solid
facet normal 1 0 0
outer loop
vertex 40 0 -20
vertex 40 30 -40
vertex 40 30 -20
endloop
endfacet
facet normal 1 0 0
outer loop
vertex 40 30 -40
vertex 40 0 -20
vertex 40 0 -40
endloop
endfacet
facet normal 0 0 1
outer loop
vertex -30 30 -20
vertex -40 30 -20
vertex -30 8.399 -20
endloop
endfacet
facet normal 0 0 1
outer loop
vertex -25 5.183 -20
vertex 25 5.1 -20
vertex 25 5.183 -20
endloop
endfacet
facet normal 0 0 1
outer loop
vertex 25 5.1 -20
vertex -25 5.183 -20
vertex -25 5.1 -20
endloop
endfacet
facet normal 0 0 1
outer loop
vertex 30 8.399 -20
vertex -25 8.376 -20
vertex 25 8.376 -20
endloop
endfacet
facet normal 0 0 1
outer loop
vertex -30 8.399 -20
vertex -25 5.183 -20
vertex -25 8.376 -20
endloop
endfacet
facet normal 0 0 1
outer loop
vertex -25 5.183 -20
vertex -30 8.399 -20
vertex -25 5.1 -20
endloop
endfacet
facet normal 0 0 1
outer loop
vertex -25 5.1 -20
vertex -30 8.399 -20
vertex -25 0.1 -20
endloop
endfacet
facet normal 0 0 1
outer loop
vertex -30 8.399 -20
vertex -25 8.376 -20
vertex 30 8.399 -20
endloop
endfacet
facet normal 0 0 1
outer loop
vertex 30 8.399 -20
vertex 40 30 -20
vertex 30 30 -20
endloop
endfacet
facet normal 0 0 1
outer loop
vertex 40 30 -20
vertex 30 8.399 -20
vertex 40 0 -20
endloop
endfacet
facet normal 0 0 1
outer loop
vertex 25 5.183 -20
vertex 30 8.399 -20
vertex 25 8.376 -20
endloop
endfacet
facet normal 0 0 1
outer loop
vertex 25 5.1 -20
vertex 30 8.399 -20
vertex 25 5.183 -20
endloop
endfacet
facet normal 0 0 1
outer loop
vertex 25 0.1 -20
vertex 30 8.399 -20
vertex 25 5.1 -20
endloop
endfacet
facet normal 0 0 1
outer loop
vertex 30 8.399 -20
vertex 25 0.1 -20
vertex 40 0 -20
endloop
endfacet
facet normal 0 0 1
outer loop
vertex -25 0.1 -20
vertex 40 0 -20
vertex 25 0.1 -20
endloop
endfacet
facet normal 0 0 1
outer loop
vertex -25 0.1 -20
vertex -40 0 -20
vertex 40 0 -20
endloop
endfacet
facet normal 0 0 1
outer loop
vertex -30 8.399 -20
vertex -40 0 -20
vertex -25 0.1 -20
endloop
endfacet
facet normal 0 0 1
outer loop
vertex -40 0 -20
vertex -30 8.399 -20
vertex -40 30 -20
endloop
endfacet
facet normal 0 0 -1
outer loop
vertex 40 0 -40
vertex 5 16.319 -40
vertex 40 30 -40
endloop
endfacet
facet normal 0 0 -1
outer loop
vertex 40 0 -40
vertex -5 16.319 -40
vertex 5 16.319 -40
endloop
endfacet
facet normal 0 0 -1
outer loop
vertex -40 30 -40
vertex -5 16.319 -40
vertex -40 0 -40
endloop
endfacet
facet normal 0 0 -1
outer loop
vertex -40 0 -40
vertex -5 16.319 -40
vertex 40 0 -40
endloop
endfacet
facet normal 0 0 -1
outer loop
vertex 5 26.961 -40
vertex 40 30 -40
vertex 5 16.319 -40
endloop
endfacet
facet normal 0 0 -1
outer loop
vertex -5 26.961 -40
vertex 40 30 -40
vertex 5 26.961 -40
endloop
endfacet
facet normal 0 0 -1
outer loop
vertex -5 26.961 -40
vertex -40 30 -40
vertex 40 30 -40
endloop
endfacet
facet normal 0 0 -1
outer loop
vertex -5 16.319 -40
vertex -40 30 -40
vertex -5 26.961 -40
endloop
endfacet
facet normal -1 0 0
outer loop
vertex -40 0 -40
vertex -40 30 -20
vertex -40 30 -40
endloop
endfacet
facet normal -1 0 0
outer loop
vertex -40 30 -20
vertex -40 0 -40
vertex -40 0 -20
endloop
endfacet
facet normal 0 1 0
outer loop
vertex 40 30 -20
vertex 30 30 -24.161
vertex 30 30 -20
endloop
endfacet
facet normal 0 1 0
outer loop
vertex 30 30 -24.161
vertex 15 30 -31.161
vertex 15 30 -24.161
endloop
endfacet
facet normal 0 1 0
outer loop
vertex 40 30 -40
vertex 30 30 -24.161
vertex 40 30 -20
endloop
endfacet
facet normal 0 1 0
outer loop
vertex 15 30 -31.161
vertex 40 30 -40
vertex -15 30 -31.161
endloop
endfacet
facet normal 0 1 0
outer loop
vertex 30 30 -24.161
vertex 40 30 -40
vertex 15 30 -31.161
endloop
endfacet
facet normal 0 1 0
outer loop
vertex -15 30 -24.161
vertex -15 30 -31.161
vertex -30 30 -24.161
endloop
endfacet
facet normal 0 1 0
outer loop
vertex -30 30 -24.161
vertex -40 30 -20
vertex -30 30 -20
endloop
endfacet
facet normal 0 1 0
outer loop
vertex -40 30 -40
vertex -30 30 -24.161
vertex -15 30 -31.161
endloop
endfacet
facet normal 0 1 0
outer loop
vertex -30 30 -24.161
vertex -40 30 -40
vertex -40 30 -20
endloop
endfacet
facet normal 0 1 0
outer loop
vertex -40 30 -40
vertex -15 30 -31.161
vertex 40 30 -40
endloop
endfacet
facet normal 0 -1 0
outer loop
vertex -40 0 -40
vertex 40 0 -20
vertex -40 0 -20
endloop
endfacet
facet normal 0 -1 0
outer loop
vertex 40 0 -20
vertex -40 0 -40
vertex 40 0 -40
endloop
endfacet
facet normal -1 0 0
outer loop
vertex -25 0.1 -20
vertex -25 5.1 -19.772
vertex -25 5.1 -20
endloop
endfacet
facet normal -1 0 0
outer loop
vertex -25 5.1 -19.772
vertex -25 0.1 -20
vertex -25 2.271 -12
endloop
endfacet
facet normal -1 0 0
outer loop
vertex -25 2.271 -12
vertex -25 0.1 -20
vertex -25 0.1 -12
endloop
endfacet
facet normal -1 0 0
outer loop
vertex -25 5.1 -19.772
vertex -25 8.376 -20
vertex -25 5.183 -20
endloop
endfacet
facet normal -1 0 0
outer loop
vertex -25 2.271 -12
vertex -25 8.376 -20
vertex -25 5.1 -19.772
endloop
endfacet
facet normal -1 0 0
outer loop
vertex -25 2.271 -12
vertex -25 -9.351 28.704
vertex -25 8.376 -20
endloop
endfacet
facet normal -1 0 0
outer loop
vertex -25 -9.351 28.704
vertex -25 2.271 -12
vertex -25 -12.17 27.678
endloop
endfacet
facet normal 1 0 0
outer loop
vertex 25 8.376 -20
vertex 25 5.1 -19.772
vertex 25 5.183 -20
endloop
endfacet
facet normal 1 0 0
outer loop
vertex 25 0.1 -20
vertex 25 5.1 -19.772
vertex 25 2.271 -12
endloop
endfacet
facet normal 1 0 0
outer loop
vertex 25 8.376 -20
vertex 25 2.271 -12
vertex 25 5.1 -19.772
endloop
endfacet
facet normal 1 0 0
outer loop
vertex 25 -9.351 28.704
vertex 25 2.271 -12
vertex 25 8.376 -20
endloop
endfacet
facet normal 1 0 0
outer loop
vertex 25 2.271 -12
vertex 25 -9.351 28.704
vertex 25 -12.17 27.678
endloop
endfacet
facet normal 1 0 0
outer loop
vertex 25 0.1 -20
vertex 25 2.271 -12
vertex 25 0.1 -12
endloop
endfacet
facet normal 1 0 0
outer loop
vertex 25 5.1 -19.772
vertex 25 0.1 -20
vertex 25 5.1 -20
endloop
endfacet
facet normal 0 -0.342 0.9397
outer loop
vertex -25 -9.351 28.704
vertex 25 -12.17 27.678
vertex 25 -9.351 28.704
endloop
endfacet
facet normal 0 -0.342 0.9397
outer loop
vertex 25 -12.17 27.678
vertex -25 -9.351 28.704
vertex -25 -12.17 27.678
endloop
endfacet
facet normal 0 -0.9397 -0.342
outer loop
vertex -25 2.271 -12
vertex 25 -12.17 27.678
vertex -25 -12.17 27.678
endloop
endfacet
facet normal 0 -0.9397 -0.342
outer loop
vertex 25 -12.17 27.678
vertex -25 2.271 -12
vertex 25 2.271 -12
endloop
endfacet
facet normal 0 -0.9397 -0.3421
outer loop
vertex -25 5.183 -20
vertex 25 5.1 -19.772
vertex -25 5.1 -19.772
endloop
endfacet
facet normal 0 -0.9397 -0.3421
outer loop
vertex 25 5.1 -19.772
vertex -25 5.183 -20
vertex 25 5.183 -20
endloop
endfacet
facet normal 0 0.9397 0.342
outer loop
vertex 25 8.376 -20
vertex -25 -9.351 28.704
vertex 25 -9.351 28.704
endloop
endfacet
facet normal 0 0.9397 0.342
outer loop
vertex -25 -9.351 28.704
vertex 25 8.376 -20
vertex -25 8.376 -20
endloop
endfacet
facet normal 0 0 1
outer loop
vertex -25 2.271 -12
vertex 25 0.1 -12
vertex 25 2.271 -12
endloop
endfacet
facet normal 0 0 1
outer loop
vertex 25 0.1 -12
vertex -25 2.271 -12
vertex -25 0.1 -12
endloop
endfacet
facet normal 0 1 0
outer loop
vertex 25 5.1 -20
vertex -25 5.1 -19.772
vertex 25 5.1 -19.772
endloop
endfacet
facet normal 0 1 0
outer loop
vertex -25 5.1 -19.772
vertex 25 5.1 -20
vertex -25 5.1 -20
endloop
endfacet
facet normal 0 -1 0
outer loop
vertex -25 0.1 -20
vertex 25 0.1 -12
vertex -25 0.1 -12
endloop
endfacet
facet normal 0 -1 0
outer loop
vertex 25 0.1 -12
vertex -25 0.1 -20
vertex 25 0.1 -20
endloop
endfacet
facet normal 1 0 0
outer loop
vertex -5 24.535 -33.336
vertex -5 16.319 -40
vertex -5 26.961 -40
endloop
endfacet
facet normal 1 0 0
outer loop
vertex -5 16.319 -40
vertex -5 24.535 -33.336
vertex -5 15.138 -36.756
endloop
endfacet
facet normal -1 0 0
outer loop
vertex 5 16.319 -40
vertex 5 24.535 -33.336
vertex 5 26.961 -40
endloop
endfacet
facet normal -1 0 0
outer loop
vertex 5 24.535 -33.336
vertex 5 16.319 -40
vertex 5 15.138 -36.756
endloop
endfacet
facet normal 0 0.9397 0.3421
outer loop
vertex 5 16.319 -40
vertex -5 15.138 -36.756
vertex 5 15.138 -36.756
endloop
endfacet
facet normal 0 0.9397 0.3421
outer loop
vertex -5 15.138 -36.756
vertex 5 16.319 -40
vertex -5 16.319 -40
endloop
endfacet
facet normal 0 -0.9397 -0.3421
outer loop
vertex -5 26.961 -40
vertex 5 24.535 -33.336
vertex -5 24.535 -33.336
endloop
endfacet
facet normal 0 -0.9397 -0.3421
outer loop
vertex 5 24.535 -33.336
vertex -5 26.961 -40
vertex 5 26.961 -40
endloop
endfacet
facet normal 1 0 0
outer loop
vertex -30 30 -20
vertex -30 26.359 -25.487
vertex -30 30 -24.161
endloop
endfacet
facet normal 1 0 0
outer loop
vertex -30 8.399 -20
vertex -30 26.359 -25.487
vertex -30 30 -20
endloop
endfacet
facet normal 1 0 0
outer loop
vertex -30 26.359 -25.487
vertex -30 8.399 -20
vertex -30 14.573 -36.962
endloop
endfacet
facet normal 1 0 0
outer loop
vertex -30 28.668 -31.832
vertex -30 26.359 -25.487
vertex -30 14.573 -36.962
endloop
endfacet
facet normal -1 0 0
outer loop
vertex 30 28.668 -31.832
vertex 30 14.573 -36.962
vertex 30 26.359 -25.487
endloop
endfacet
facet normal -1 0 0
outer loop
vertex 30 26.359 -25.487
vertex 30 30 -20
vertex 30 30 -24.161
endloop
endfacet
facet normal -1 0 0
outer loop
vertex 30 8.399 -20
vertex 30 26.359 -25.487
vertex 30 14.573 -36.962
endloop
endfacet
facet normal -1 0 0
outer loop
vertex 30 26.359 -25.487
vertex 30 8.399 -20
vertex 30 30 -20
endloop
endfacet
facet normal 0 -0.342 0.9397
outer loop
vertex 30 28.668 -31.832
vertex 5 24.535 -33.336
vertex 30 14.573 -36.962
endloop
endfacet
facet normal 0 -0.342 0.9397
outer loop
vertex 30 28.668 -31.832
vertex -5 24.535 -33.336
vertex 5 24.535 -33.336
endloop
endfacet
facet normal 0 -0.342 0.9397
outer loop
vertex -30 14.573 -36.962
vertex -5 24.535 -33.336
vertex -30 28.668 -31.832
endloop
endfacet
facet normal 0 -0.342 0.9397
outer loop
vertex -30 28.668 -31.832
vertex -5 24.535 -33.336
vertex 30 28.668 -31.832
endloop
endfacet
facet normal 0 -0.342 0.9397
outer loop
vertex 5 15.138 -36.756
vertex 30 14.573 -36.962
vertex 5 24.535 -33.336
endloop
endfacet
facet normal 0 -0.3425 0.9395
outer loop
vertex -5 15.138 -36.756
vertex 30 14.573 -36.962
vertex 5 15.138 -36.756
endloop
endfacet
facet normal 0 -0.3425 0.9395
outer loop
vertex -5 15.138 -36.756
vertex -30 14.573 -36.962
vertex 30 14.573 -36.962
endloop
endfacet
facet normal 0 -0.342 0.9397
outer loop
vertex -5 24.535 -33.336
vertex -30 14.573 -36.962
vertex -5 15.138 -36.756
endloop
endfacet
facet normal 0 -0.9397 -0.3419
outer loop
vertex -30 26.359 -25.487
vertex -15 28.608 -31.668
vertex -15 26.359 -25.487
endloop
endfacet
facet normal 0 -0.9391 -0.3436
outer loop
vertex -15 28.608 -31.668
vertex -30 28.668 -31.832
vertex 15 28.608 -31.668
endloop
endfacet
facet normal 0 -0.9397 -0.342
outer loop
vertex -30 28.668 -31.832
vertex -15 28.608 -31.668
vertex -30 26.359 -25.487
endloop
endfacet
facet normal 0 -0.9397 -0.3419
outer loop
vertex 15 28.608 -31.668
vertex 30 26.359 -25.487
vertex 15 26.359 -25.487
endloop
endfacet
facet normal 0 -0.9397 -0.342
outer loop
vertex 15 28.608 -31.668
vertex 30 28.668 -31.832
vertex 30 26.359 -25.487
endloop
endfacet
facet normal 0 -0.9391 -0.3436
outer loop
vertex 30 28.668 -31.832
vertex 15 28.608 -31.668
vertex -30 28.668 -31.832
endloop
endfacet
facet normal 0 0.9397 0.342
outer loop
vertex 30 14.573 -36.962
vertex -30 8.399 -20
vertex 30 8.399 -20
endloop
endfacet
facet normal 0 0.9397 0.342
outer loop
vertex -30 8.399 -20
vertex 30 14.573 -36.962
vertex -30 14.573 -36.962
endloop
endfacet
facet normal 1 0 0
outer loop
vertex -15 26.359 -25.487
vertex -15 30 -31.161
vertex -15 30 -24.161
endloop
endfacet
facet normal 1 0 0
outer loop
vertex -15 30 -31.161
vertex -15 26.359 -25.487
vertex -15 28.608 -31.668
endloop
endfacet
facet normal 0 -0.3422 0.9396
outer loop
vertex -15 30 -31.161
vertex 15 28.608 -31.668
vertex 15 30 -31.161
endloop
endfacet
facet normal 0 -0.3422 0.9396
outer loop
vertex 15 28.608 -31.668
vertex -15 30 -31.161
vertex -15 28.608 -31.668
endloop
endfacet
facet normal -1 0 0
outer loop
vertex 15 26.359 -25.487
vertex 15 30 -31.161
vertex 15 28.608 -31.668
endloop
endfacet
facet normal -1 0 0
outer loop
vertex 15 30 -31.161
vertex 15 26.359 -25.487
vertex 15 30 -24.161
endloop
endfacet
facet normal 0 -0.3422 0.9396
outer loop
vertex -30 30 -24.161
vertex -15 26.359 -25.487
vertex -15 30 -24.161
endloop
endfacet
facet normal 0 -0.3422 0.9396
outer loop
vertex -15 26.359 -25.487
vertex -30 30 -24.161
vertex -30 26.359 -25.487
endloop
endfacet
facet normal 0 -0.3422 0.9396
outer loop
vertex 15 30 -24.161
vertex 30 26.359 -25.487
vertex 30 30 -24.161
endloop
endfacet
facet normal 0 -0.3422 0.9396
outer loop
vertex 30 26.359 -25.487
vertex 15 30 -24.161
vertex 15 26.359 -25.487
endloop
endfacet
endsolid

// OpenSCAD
difference() {
	union() {
		translate([0,15,-30]) cube([80,30,20],center=true);
		translate([0,-0.5,0]) rotate([20]) cube([50,3,60], center=true);
		translate([0,2.6,-17]) cube([50,5,10], center=true);
	}
	union() {
		translate([0,18,-30]) rotate([20]) cube([10,10,30],center=true);
		translate([0,18.2,-25]) rotate([20]) cube([60,15,20],center=true);
		translate([0,25,-25]) rotate([20]) cube([30,15,15],center=true);
		translate([0,25,-18]) rotate([20]) cube([60,15,15],center=true);
	}
}
